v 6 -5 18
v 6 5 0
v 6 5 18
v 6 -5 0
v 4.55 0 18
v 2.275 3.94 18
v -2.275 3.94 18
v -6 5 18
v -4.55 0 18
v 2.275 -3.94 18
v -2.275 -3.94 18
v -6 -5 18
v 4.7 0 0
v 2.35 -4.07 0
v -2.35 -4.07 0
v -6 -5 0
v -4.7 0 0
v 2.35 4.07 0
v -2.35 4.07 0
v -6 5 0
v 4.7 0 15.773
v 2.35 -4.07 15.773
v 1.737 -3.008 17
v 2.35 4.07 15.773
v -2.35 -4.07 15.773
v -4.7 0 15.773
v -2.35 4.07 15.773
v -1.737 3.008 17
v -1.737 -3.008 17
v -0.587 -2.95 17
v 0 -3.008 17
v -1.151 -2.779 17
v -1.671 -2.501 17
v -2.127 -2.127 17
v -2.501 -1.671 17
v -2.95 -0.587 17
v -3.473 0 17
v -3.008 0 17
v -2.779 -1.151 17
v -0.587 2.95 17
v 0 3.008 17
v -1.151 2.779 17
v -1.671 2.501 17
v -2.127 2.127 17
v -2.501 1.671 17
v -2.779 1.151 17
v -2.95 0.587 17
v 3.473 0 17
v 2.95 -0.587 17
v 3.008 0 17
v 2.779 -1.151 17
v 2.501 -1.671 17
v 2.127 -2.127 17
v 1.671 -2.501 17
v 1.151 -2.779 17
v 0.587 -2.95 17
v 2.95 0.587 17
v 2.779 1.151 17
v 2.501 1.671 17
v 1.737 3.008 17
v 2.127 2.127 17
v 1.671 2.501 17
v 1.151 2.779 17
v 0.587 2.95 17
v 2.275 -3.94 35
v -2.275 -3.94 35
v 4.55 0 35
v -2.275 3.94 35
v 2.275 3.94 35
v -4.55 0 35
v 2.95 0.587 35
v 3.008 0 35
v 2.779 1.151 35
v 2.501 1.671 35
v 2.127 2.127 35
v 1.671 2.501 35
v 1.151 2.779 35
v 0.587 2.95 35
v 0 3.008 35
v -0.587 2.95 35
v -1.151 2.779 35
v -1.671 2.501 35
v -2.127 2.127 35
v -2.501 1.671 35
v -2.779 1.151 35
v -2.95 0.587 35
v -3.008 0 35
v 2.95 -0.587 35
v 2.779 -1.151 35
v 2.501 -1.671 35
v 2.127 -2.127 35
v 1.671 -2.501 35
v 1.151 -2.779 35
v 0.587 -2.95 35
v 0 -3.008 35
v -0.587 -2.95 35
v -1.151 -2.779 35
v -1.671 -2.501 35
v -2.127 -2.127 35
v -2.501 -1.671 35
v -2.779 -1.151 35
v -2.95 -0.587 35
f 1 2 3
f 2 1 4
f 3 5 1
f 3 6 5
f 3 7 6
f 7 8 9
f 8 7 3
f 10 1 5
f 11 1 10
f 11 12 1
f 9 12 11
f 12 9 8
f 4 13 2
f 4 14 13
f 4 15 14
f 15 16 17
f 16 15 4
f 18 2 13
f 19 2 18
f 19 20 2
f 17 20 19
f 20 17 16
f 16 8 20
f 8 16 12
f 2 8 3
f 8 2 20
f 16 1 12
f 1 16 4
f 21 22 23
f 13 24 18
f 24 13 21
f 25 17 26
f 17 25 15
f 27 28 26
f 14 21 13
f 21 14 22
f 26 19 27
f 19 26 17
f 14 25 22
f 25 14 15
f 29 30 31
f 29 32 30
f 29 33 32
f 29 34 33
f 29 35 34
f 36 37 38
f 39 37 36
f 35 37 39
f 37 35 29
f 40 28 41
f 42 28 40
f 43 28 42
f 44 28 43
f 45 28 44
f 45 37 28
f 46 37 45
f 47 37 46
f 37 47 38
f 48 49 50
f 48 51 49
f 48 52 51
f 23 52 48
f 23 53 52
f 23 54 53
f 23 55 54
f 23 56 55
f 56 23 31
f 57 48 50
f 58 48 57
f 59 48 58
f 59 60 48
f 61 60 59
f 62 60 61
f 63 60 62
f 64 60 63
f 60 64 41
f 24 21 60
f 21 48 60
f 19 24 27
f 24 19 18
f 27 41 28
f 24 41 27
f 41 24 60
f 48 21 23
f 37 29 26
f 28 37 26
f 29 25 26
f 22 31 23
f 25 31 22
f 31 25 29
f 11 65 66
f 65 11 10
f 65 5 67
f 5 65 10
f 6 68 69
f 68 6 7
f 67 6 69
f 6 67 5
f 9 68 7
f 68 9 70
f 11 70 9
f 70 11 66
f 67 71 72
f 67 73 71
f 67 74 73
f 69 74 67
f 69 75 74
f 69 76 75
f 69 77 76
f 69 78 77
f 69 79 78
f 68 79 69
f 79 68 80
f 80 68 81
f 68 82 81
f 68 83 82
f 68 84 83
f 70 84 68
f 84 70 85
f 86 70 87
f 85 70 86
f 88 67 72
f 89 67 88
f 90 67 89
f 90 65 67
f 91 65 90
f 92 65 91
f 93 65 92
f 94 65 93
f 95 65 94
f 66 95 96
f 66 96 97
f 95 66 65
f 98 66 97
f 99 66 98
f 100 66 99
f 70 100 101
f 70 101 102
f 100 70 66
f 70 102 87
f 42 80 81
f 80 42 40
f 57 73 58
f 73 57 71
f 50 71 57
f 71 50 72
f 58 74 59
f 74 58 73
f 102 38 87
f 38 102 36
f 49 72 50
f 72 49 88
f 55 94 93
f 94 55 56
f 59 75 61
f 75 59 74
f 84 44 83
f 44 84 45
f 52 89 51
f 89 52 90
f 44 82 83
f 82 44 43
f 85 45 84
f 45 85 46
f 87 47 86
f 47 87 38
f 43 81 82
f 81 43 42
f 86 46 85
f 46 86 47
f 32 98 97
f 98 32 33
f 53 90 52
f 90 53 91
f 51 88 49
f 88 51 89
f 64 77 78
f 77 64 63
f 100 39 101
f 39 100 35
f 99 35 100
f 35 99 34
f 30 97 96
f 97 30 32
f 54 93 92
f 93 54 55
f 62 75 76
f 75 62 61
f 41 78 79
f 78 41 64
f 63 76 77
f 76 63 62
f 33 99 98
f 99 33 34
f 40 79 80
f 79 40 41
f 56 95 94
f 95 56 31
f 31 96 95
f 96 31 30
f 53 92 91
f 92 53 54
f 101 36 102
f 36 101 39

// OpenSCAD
//////////////////////////////////////////////////////////////////////////////////////
///
///  Z-axis backlash - support for Split X-Ends - Prusa i3, with Endstop and Belt Tensioner
///
//////////////////////////////////////////////////////////////////////////////////////
///
///  2016-04-19 bfj@bflm.eu, Czech Republic
///
///  released under Creative Commons - Attribution - Share Alike licence (CC BY-SA)
//////////////////////////////////////////////////////////////////////////////////////

/*[globales]*/
//metric nut size
m = 5; //[5,6,8]
//hole for threaded rod
hole_tolerance = 0.45;
//nut tolerance
nut_tolerance = 0.1;
//if motor part then idler=No else idler=Yes
idler = 0;//[0:No,1:Yes]

/*[dimensions]*/
//top part height in mm (exterior dimension)
height_top = 17;
//botom part height in mm (exterior dimension)
height_bottom = 18;


/*[hidden]*/
width_bottom = 2*m+2;
depth_bottom = 2*m;
tolerance = 0.02;

//Based on: http://www.roymech.co.uk/Useful_Tables/Screws/Hex_Screws.htm
METRIC_NUT_AC_WIDTHS =
[
	-1, //0 index is not used but reduces computation
	-1,
	-1,
	6.40,//m3
	8.10,//m4
	9.20,//m5
	11.50,//m6
	-1,
	15.00,//m8
	-1,
	19.60,//m10
	-1,
	22.10,//m12
	-1,
	-1,
	-1,
	27.70,//m16
	-1,
	-1,
	-1,
	34.60,//m20
	-1,
	-1,
	-1,
	41.60,//m24
	-1,
	-1,
	-1,
	-1,
	-1,
	53.1,//m30
	-1,
	-1,
	-1,
	-1,
	-1,
	63.5//m36
];

metric_radius = METRIC_NUT_AC_WIDTHS[m]/2;
bottom_nut_radius = metric_radius +nut_tolerance;
top_nut_radius = metric_radius -nut_tolerance/2;
top_hole_radius = reduction_hole(r=m/2+hole_tolerance,fn=32);
inner_r2 = top_hole_radius/cos(30);
echo(top_hole_radius);
module nutHoleHeight(r, height )
{

		cylinder(r= r, h=height, $fn = 6, center=[0,0]);
	
}



module chamfered_nutHole(r1, r2, height){
          
    d = r1-r2;
    hull(){
  	  translate([0,0,d])cylinder(r= r1,h=height-2*d,$fn = 6, center=[0,0]);
      cylinder(r= r2,h=height,$fn = 6, center=[0,0]);
   }
}

module z_backlash(){

d = bottom_nut_radius-inner_r2;  
difference(){
union(){
difference(){
translate([0,0,height_bottom/2])
cube([width_bottom,depth_bottom,height_bottom], center = true);
   
translate([0,0,-tolerance-d])
chamfered_nutHole(r1=bottom_nut_radius,  height=height_bottom+tolerance-1+d, r2=inner_r2);
    
}    

translate([0,0,height_bottom])
nutHoleHeight(r=top_nut_radius,  height=height_top);
    
}

cylinder(r=top_hole_radius,h=height_top+height_bottom+tolerance, $fn = 32,center=[0,0]);

}

}

function reduction_hole(r, fn) = r/cos(360/fn);


if(idler == 1){
    difference(){
        z_backlash();
        diff = m/cos(30)-m;
        r_cutter = m+diff;
        x0_cutter = (top_hole_radius+r_cutter)*sin(30);
        y0_cutter = (top_hole_radius+r_cutter)*cos(30);
        translate([-x0_cutter,y0_cutter,height_bottom+1+height_top/2+tolerance]){
            cylinder(r=r_cutter,h=height_top,center=true,$fn=32);
        }
    } 

} else {
    
    z_backlash();
    
}
